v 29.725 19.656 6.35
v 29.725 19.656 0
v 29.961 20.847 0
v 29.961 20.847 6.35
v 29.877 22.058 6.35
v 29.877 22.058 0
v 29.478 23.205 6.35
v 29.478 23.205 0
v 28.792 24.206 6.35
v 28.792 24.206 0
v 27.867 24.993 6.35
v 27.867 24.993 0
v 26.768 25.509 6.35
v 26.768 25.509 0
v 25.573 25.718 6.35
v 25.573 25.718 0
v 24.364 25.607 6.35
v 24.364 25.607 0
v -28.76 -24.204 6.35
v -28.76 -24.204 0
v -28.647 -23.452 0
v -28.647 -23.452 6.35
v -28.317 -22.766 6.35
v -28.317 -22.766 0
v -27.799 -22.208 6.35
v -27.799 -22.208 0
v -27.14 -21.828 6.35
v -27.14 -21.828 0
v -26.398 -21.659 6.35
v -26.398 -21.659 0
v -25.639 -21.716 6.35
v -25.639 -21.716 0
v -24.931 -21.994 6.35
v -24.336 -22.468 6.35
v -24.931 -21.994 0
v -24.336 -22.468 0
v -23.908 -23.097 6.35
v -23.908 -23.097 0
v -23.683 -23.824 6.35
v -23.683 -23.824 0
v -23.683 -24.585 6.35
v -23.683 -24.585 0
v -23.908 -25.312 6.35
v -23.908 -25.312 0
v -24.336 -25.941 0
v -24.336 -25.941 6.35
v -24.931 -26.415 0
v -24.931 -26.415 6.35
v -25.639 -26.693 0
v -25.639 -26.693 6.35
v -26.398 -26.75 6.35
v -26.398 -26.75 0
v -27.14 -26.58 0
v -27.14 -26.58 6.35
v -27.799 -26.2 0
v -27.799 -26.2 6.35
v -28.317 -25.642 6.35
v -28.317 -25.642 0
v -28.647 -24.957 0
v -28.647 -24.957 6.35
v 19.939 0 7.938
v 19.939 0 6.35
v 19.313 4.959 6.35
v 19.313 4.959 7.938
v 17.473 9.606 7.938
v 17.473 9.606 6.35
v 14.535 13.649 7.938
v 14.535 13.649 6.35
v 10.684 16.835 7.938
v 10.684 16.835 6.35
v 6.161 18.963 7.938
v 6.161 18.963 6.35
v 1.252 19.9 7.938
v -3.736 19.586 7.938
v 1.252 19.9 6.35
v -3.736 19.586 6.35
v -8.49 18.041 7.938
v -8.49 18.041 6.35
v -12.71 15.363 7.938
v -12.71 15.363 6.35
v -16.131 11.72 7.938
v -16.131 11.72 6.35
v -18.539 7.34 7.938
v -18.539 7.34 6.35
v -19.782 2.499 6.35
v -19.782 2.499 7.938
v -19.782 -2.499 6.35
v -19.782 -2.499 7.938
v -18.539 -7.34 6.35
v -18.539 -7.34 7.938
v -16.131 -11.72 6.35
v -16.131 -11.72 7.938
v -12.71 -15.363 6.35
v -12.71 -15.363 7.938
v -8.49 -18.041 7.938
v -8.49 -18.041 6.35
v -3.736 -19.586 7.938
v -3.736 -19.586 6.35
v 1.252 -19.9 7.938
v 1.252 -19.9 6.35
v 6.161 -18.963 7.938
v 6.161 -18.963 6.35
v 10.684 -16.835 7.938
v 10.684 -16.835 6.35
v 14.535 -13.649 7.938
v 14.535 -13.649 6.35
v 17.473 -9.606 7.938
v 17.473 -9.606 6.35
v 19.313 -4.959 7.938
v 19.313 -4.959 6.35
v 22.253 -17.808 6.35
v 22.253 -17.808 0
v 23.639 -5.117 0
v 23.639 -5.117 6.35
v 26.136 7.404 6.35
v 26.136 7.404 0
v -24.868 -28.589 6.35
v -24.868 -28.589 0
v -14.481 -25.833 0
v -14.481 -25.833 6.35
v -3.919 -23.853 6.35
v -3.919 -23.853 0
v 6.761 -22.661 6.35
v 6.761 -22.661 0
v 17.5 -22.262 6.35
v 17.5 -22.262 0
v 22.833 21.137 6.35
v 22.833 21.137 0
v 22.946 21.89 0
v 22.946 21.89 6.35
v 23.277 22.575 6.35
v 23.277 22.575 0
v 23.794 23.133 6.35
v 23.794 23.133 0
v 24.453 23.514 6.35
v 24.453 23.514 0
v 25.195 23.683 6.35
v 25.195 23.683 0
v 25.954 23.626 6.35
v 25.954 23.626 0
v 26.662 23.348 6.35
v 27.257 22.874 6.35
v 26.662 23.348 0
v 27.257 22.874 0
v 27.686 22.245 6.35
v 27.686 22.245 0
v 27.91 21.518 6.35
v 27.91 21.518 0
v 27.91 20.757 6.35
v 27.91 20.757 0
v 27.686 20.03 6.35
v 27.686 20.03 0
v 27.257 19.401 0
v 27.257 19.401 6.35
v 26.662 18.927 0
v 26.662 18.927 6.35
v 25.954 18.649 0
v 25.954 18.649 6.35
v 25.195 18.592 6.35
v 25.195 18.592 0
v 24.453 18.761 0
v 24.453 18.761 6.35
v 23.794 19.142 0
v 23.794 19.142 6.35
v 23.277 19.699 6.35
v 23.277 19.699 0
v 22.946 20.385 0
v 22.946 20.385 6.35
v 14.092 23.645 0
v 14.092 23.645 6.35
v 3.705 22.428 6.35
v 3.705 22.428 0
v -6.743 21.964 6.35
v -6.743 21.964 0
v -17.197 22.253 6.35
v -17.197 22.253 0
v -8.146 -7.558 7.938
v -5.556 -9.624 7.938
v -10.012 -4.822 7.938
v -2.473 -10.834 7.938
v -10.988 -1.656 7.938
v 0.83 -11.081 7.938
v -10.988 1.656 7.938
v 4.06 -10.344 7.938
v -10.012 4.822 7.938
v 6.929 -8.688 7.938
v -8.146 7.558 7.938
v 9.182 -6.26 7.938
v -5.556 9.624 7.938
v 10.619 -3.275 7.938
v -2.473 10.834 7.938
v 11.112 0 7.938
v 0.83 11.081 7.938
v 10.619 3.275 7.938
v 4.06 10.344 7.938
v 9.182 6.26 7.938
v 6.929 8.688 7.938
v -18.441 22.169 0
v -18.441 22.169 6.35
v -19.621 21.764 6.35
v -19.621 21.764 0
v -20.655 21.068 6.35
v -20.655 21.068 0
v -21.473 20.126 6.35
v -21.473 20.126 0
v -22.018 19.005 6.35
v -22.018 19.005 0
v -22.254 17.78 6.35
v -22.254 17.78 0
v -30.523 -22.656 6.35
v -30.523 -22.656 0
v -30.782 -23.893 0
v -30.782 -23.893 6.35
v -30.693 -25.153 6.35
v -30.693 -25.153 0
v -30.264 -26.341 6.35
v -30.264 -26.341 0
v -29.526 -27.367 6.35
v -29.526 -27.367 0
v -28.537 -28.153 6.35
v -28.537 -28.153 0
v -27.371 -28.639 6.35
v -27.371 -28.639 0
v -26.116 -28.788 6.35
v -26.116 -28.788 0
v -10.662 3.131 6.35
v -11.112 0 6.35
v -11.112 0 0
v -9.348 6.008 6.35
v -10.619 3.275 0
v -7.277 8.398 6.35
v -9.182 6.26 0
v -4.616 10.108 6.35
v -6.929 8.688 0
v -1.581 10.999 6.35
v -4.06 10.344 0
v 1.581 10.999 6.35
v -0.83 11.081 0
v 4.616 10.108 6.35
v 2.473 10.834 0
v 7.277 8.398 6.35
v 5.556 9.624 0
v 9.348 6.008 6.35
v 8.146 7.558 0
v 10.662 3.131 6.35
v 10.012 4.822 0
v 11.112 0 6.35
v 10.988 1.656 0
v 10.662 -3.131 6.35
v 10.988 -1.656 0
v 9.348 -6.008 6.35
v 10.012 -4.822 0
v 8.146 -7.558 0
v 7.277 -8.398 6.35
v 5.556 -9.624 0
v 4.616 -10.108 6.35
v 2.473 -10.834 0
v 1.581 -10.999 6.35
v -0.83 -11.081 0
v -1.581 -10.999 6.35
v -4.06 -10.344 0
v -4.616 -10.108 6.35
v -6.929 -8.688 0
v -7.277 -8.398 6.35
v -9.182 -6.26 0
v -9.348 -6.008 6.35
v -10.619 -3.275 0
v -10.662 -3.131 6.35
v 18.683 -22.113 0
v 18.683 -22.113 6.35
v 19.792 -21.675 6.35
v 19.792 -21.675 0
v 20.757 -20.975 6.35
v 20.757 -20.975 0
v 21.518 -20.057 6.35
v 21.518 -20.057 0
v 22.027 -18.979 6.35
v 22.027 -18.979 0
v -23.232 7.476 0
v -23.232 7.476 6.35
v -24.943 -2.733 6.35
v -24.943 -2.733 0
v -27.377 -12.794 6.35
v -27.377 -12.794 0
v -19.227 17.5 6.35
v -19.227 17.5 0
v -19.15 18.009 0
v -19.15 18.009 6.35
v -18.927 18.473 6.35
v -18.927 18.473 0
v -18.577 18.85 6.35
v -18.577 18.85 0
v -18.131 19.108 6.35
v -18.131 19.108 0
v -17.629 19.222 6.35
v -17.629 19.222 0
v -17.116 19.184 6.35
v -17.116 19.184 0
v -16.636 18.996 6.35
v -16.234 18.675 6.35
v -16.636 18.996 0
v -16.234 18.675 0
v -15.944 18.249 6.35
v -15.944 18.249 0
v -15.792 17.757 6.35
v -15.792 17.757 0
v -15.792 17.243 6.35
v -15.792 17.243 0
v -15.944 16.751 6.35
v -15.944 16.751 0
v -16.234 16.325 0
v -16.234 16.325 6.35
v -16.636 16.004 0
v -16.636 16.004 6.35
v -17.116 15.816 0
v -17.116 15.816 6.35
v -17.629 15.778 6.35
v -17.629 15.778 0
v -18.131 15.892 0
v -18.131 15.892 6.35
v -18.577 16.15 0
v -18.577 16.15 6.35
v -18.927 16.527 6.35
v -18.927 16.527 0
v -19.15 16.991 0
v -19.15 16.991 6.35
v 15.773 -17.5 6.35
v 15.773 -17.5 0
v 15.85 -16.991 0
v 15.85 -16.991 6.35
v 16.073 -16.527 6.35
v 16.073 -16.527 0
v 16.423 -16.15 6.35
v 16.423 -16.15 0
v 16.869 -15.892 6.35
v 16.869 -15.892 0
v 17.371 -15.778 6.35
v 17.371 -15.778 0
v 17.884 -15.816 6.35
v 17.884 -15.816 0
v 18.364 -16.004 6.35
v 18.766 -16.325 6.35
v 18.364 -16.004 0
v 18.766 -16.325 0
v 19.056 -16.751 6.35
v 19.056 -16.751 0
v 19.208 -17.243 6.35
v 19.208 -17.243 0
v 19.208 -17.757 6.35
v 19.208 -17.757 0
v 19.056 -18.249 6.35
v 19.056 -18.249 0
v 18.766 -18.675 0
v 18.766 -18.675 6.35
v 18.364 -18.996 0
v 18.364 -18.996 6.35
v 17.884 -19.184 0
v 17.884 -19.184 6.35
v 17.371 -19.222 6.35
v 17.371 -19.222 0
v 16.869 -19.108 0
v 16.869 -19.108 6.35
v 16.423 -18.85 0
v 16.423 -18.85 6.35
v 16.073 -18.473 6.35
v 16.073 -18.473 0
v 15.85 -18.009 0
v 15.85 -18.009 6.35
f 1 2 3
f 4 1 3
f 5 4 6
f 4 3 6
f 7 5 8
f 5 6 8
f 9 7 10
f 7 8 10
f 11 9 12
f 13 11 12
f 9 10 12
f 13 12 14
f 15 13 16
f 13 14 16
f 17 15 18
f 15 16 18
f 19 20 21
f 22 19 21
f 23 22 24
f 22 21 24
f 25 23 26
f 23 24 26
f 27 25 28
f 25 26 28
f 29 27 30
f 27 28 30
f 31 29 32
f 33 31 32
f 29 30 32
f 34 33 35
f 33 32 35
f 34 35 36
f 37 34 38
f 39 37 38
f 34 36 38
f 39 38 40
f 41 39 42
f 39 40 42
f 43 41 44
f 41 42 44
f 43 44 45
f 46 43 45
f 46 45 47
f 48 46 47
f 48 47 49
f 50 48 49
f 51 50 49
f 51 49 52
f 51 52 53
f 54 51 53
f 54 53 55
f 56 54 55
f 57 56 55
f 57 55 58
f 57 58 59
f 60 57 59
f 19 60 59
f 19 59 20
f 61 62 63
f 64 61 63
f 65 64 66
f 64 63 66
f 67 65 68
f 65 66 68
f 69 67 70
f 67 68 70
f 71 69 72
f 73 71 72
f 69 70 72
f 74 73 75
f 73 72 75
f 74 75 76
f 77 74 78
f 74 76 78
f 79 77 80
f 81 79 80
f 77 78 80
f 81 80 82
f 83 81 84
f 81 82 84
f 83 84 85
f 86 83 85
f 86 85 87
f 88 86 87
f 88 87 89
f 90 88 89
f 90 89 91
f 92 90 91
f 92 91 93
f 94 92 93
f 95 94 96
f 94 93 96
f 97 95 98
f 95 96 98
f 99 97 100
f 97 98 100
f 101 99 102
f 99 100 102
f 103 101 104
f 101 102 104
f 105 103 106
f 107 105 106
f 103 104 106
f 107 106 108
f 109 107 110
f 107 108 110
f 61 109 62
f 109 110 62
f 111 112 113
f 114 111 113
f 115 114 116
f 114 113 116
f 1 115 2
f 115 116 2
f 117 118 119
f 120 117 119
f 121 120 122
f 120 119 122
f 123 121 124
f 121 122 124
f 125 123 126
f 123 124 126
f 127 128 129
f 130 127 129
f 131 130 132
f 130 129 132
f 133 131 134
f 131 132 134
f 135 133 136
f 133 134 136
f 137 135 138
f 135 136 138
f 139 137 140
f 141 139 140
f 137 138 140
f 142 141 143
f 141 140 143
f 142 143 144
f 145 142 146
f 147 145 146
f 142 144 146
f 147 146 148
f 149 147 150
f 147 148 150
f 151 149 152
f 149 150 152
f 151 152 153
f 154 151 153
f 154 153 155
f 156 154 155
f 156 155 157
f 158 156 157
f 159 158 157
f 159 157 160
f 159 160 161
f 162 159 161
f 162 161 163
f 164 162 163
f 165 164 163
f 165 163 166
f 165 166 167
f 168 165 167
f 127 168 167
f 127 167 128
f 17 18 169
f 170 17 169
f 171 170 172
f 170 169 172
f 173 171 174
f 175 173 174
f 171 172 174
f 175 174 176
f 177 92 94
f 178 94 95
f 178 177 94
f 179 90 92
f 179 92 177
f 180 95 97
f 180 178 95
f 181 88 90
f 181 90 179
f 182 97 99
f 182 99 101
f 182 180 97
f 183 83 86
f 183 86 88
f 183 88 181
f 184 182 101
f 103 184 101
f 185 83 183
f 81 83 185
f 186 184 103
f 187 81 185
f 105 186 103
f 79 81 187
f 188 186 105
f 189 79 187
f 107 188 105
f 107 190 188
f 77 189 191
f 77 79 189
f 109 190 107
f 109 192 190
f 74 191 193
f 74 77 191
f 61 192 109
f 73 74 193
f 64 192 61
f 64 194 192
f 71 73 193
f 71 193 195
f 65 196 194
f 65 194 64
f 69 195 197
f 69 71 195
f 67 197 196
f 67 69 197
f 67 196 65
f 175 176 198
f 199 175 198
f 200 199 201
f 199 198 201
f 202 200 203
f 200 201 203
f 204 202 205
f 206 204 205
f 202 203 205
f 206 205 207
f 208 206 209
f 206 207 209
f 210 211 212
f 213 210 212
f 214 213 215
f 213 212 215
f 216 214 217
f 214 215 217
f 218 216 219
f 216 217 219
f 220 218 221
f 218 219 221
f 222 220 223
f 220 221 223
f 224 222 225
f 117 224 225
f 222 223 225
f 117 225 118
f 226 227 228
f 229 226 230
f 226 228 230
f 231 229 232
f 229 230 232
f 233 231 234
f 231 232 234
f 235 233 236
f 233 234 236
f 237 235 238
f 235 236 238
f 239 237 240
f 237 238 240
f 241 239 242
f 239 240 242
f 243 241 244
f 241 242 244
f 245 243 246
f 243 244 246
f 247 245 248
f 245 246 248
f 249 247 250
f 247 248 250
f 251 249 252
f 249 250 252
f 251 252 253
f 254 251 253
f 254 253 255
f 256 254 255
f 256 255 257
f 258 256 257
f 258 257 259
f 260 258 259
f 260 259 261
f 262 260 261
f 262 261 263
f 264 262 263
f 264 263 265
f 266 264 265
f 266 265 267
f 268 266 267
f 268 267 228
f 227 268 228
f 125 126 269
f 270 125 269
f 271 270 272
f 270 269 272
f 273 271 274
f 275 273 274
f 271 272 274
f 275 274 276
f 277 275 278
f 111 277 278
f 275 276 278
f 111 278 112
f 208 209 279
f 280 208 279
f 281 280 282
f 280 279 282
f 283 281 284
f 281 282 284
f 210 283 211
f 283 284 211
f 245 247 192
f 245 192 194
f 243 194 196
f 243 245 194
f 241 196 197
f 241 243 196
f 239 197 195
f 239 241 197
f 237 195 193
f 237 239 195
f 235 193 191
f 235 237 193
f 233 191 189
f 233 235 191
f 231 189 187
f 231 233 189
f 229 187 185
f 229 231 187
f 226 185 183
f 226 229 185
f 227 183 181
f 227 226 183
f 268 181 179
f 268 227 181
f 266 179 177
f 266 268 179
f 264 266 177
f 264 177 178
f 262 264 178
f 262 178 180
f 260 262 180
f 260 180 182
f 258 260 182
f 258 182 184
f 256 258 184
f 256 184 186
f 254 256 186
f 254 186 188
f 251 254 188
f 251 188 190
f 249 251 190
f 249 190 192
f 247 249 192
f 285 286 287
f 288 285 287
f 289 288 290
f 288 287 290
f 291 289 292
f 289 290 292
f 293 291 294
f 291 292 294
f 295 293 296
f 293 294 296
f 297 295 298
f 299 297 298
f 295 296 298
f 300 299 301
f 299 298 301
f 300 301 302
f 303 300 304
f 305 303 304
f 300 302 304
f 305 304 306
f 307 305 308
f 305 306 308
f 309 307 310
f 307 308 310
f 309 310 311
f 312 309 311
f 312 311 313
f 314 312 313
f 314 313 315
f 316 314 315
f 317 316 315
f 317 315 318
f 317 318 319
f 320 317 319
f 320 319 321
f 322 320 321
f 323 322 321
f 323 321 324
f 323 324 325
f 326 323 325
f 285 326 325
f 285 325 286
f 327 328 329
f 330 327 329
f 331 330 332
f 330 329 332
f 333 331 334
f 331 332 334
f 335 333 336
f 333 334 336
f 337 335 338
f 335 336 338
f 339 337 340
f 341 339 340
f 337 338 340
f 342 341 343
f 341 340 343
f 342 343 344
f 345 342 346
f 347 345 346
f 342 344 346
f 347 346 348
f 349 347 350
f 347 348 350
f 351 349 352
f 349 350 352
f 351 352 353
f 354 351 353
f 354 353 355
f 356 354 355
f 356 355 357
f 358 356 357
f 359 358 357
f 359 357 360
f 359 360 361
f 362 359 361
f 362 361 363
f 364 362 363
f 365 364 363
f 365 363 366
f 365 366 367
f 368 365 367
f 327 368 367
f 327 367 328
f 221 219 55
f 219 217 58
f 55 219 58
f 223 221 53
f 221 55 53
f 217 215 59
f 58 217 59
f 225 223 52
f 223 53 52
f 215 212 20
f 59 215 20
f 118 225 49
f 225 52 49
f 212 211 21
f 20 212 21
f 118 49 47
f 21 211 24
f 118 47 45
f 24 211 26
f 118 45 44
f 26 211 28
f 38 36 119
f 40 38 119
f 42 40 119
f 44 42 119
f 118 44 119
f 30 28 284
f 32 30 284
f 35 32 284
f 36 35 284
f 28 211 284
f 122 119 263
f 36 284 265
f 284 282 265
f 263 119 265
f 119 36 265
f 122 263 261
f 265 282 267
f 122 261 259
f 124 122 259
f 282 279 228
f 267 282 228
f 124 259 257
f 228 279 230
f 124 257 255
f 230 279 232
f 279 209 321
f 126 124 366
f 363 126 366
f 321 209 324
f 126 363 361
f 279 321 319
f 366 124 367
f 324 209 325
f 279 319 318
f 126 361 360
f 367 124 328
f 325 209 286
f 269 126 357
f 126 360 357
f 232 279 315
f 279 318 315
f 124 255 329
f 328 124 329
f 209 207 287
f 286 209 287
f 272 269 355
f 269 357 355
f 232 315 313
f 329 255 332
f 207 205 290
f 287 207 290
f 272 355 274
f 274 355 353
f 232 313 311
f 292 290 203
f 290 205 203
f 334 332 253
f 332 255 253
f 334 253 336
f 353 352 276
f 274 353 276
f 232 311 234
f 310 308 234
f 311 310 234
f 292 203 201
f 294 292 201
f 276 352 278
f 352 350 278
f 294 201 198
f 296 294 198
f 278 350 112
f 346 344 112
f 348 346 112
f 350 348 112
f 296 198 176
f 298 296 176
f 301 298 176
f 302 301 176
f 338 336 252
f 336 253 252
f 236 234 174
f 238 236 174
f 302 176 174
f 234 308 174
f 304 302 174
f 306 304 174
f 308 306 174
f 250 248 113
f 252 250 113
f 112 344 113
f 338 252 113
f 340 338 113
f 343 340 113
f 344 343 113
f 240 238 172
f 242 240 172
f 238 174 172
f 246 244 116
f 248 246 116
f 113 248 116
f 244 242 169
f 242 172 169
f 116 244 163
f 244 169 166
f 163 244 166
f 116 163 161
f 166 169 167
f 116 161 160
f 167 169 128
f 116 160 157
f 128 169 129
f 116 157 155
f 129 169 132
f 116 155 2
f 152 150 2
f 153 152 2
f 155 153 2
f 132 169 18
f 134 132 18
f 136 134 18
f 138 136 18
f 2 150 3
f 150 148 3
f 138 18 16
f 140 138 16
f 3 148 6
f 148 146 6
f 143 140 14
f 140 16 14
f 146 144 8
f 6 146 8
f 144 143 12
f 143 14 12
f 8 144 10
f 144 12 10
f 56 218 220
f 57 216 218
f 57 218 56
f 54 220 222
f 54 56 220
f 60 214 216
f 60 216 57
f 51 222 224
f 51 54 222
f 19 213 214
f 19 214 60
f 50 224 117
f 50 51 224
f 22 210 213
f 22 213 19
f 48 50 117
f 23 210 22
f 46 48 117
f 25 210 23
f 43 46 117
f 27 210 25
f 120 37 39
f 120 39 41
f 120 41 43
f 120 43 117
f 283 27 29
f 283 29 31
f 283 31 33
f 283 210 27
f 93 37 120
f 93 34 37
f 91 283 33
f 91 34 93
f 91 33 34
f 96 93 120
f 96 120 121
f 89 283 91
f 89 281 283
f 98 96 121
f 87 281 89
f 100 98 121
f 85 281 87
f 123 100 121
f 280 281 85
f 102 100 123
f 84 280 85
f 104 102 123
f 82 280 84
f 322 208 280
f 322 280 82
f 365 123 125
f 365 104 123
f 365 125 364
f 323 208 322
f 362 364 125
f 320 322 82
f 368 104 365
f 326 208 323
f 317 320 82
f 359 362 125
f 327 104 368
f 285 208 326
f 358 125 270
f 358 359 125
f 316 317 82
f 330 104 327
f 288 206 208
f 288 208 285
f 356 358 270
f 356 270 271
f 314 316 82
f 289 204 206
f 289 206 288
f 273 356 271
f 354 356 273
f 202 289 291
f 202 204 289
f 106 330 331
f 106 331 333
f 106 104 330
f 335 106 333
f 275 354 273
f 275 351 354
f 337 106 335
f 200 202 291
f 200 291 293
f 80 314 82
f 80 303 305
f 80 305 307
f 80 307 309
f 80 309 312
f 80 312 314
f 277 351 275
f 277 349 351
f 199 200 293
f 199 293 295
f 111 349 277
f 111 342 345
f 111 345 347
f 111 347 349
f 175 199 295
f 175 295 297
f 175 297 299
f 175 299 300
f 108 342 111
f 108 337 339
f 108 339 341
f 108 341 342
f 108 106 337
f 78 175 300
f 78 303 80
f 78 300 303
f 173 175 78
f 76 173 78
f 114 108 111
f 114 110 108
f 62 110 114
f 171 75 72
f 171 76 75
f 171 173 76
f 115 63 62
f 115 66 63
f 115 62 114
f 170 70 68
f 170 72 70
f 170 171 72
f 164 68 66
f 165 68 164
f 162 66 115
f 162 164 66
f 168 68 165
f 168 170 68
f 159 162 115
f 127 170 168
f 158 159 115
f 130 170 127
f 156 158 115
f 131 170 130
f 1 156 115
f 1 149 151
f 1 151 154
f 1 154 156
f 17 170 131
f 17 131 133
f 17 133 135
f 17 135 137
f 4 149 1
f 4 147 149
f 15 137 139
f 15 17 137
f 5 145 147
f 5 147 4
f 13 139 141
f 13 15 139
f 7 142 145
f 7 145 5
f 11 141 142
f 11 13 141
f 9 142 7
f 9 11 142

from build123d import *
from build123d.topology import SkipClean

# Parameters (mm, degrees)
BOSS_EXTRUDE1_DEPTH          = 6.35
F_7_8_0_875_DIAMETER_HOLE1_D = 22.225
F_10_CLEARANCE_HOLE1_D       = 5.1054
F_8_32_TAPPED_HOLE1_D        = 3.4544
SKETCH33_R                   = 19.939
SKETCH33_R_2                 = 11.1125
BOSS_EXTRUDE3_DEPTH          = 1.5875


with BuildPart() as part:
    # Sketch1 → Boss-Extrude1 (new body)
    with BuildSketch(Plane.XY):
        with BuildLine():
            ThreePointArc((29.724646249, 19.656342437), (28.792029634, 24.206107761), (24.36391271, 25.606792867))
            ThreePointArc((24.36391271, 25.606792867), (3.704744399, 22.428476482), (-17.196740725, 22.25283495))
            ThreePointArc((-17.196740725, 22.25283495), (-20.654876788, 21.06765451), (-22.254232731, 17.780494905))
            ThreePointArc((-22.254232731, 17.780494905), (-24.94278341, -2.733369886), (-30.522874393, -22.655958523))
            ThreePointArc((-30.522874393, -22.655958523), (-29.526294957, -27.367332021), (-24.868197962, -28.588947016))
            ThreePointArc((-24.868197962, -28.588947016), (-3.918964321, -23.852830981), (17.5, -22.2625))
            ThreePointArc((17.5, -22.2625), (20.756780188, -20.974879718), (22.252512093, -17.808277557))
            ThreePointArc((22.252512093, -17.808277557), (24.749635252, 1.17113371), (29.724646249, 19.656342437))
        make_face()
    extrude(amount=BOSS_EXTRUDE1_DEPTH)

    # 7/8 (0.875) Diameter Hole1 (through all)
    with Locations(Plane.XY.offset(6.35)):
        with Locations((0, 0)):
            Hole(F_7_8_0_875_DIAMETER_HOLE1_D / 2)

    # #10 Clearance Hole1 (through all)
    with Locations(Plane.XY.offset(6.35)):
        with Locations((25.385765971, 21.137420428), (-26.207516439, -24.204234926)):
            Hole(F_10_CLEARANCE_HOLE1_D / 2)

    # #8-32 Tapped Hole1 (through all)
    with Locations(Plane.XY.offset(6.35)):
        with Locations((17.5, -17.5), (-17.5, 17.5)):
            Hole(F_8_32_TAPPED_HOLE1_D / 2)

    # Sketch33 → Boss-Extrude3 (add)
    with SkipClean():  # the faces are left unmerged after this step: merging them gives an invalid solid
        with BuildSketch(Plane.XY.offset(6.35)):
            Circle(SKETCH33_R)
            Circle(SKETCH33_R_2, mode=Mode.SUBTRACT)
        extrude(amount=BOSS_EXTRUDE3_DEPTH)
    add(part.part.scale(1), mode=Mode.REPLACE)  # the faces are merged on a copy


solid = part.part
